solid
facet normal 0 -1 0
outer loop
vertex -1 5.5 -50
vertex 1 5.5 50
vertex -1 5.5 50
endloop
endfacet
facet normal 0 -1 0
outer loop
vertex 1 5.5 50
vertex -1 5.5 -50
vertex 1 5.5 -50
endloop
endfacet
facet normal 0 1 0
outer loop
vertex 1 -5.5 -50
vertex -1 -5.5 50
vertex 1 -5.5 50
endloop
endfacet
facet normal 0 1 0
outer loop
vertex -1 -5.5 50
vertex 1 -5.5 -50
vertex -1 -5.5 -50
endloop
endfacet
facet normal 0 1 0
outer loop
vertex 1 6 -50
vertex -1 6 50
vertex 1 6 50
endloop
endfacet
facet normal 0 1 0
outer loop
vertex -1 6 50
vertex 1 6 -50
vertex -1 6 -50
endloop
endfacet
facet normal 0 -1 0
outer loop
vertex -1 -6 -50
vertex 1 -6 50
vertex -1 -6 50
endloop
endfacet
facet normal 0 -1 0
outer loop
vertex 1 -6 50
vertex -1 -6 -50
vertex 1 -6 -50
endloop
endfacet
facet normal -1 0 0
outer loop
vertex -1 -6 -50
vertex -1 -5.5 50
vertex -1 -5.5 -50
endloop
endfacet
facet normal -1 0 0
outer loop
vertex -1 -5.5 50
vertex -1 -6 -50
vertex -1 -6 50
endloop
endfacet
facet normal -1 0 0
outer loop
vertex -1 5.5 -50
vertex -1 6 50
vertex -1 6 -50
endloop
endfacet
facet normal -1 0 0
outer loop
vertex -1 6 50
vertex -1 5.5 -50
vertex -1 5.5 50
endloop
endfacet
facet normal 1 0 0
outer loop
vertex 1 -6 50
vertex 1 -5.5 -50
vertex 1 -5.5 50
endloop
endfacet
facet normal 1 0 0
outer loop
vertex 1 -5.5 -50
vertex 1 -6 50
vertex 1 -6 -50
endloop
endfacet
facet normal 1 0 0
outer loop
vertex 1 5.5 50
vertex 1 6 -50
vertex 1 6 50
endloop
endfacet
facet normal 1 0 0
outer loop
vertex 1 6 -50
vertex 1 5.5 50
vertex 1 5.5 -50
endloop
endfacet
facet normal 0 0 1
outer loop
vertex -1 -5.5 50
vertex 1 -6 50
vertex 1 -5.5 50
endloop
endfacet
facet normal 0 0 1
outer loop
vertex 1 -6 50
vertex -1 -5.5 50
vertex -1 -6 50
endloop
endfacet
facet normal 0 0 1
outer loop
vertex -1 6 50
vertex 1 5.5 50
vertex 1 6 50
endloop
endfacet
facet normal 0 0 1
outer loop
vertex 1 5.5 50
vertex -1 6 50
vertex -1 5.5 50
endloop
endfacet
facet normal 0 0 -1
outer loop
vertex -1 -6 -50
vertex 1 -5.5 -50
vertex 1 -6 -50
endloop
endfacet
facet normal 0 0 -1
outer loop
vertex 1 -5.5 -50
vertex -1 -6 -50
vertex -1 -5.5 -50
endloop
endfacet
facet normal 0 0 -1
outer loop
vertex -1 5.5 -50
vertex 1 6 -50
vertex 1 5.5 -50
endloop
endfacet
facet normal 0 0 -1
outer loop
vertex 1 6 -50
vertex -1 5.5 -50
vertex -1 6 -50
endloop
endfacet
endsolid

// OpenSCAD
// 20x40 aluminium T-slot extrusion profile, 100mm long
// One connected solid (outer body with connected internal voids removed)

$fn = 96;

// Exact required overall dimensions
W = 20.0;   // X
H = 40.0;   // Y
L = 100.0;  // Z

// Profile parameters (typical-ish 20x40 T-slot look; all formulas, no arbitrary placement)
wall_t      = 2.0;   // outer wall thickness
web_t       = 2.0;   // internal web thickness (cross)
slot_open   = 6.0;   // slot mouth width
slot_depth  = 6.0;   // depth from outer face to inner cavity
slot_cav_w  = 11.0;  // inner cavity width
slot_cav_d  = 8.0;   // inner cavity depth (beyond slot_depth)
center_bore_d = 6.8; // center bore diameter

// Corner holes (optional)
cornerHole = 1;
corner_hole_d = 4.2;
corner_hole_offset = 6.0;

overlap = 0.6; // robust boolean overlap

module outer_body() {
    cube([W, H, L], center=true);
}

// T-slot cutouts on all 4 faces; guaranteed to intersect outer body
module t_slot_cutouts() {
    union() {
        // +X face
        translate([ W/2 - (slot_depth + overlap)/2, 0, 0 ])
            cube([slot_depth + overlap, slot_open, L + 2*overlap], center=true);
        translate([ W/2 - slot_depth - (slot_cav_d + overlap)/2 + overlap, 0, 0 ])
            cube([slot_cav_d + overlap, slot_cav_w, L + 2*overlap], center=true);

        // -X face
        translate([ -W/2 + (slot_depth + overlap)/2, 0, 0 ])
            cube([slot_depth + overlap, slot_open, L + 2*overlap], center=true);
        translate([ -W/2 + slot_depth + (slot_cav_d + overlap)/2 - overlap, 0, 0 ])
            cube([slot_cav_d + overlap, slot_cav_w, L + 2*overlap], center=true);

        // +Y face
        translate([ 0, H/2 - (slot_depth + overlap)/2, 0 ])
            cube([slot_open, slot_depth + overlap, L + 2*overlap], center=true);
        translate([ 0, H/2 - slot_depth - (slot_cav_d + overlap)/2 + overlap, 0 ])
            cube([slot_cav_w, slot_cav_d + overlap, L + 2*overlap], center=true);

        // -Y face
        translate([ 0, -H/2 + (slot_depth + overlap)/2, 0 ])
            cube([slot_open, slot_depth + overlap, L + 2*overlap], center=true);
        translate([ 0, -H/2 + slot_depth + (slot_cav_d + overlap)/2 - overlap, 0 ])
            cube([slot_cav_w, slot_cav_d + overlap, L + 2*overlap], center=true);
    }
}

// Internal voids: center bore + four quadrant pockets, leaving a cross-web and outer walls.
// Pockets are clamped so they cannot remove the outer walls or the cross-web.
module internal_voids() {
    // Available half-spans inside outer walls
    inner_half_x = W/2 - wall_t;
    inner_half_y = H/2 - wall_t;

    // Pocket sizes that leave web_t at center
    pocket_x = max(0.1, 2*(inner_half_x - web_t/2));
    pocket_y = max(0.1, 2*(inner_half_y - web_t/2));

    // Pocket centers (touch web, stay inside walls)
    pocket_cx = web_t/2 + pocket_x/2;
    pocket_cy = web_t/2 + pocket_y/2;

    union() {
        // Center bore
        cylinder(d=center_bore_d, h=L + 2*overlap, center=true);

        // Four quadrant pockets
        for (sx = [-1, 1], sy = [-1, 1]) {
            translate([ sx*pocket_cx, sy*pocket_cy, 0 ])
                cube([pocket_x, pocket_y, L + 2*overlap], center=true);
        }
    }
}

module corner_holes() {
    if (cornerHole) {
        union() {
            for (sx = [-1, 1], sy = [-1, 1]) {
                translate([
                    sx*(W/2 - corner_hole_offset),
                    sy*(H/2 - corner_hole_offset),
                    0
                ])
                cylinder(d=corner_hole_d, h=L + 2*overlap, center=true);
            }
        }
    }
}

module extrusion() {
    difference() {
        outer_body();
        t_slot_cutouts();
        internal_voids();
        corner_holes();
    }
}

extrusion();
